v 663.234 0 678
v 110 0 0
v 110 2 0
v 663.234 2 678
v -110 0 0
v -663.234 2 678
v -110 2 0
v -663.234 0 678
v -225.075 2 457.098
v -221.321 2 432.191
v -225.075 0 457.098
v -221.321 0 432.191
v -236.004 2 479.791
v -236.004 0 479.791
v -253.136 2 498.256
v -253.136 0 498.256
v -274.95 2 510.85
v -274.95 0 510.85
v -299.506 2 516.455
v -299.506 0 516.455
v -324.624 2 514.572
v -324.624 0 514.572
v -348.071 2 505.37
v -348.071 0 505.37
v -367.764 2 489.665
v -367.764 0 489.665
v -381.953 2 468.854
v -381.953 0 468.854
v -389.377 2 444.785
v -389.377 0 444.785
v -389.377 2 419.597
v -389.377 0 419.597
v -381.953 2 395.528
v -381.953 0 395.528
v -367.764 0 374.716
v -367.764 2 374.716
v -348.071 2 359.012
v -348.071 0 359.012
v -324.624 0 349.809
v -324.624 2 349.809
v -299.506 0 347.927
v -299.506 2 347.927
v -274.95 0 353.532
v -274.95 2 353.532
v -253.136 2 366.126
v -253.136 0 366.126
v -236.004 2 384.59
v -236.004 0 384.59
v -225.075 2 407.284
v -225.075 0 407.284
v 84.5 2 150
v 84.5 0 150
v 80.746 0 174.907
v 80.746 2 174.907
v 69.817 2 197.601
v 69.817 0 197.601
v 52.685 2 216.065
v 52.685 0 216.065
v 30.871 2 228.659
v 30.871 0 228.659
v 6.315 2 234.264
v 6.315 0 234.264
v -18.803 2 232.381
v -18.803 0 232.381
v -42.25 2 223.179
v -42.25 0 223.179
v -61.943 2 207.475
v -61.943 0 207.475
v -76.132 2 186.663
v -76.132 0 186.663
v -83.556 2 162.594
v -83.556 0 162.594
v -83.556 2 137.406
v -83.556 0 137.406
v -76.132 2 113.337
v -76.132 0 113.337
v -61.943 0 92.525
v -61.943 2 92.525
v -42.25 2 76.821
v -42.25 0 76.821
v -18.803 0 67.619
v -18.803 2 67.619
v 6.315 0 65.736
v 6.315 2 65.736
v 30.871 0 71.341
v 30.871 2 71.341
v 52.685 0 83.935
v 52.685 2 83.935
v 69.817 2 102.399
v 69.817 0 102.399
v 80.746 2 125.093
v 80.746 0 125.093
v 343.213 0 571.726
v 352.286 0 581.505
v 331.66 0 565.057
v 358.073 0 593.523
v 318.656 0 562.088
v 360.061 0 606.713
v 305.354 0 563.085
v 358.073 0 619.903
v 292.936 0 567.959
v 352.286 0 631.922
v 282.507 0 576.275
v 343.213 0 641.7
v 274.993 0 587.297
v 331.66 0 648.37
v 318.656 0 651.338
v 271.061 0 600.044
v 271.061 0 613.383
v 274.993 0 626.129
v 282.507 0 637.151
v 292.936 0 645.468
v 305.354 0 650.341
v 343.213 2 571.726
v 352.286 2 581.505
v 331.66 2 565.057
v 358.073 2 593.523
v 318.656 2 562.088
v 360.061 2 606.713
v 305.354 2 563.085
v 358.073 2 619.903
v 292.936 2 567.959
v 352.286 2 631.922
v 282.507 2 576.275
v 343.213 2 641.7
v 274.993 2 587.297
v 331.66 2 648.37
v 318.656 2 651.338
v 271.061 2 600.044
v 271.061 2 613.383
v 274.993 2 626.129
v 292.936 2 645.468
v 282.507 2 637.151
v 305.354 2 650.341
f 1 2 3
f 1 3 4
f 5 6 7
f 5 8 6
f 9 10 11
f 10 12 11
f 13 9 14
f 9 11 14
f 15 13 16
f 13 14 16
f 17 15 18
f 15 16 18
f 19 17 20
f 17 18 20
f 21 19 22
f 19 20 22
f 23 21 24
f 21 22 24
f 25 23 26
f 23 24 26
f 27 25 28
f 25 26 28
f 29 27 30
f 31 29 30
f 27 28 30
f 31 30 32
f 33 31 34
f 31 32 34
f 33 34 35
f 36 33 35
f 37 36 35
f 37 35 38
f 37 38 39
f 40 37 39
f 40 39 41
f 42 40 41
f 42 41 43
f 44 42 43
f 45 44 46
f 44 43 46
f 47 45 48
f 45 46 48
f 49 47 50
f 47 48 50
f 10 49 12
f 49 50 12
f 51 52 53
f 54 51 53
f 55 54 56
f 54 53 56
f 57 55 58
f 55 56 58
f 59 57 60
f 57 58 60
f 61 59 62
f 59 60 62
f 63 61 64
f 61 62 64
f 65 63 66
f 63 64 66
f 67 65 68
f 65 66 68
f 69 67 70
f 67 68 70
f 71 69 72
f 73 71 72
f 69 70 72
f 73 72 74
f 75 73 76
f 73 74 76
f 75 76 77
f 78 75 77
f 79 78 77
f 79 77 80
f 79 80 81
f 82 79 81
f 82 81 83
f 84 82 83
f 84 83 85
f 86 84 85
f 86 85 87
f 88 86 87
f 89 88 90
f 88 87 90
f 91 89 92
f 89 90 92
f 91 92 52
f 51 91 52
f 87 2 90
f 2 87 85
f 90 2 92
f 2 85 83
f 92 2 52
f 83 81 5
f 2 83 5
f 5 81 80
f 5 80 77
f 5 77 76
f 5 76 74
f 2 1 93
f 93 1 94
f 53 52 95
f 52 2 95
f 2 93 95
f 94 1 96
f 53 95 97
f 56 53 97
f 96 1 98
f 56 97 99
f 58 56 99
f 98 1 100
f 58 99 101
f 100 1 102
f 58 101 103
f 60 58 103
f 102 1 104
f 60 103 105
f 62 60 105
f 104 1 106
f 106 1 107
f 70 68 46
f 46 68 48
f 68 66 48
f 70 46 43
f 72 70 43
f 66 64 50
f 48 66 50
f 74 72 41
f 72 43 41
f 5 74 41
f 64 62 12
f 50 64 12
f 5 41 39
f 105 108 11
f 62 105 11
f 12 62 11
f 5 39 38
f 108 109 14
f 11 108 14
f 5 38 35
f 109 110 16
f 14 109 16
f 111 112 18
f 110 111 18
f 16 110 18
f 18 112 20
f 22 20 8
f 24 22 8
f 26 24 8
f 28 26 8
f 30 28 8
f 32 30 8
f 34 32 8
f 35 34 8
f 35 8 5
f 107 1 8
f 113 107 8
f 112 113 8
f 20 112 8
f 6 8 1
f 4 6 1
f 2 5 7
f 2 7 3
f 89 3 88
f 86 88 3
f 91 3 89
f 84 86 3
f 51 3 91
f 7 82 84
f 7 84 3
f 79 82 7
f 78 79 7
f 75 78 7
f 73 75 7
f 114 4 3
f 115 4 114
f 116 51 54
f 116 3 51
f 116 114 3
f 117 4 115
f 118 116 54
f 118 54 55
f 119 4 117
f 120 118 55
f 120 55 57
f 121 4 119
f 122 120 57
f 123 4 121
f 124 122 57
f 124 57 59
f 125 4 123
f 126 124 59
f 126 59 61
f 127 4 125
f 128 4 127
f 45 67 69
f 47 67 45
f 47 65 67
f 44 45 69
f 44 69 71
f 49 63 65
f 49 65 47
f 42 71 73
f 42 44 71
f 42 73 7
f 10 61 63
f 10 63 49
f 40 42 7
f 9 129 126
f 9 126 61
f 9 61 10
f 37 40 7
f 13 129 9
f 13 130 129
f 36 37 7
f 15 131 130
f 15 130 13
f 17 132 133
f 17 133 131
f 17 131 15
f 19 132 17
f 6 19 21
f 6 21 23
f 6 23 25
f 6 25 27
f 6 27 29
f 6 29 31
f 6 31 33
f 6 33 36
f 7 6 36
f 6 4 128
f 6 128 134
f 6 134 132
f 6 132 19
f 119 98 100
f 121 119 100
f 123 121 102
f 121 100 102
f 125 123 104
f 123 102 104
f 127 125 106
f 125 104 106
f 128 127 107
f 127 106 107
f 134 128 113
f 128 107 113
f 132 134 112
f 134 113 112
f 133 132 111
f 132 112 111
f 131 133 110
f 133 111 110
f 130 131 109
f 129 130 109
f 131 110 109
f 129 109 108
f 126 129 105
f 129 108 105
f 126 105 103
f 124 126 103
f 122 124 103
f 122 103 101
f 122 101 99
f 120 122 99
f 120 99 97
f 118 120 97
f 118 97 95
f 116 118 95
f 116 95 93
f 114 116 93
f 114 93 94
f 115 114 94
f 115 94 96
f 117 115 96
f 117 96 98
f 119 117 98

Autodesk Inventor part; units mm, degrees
ref_plane "YZ Plane" through (0, 0, 0) normal (1, 0, 0) x (0, 1, 0)
ref_plane "XZ Plane" through (0, 0, 0) normal (0, 1, 0) x (-1, 0, 0)
ref_plane "XY Plane" through (0, 0, 0) normal (0, 0, 1) x (1, 0, 0)
sketch "Sketch1" plane through (0, 0, 0) normal (0, 1, 0) x (-1, 0, 0)
  line L0 (0, 820) -> (0, 0)
  line L1 (760, 796.5895) -> (760, 820)
  line L2 (760, 820) -> (0, 820)
  line L3 (760, 796.5895) -> (110, 0)
  line L4 (110, 0) -> (0, 0)
  line L5 (758.3, 820) -> (755.9389, 786.2346)
  line L6 (755.9389, 786.2346) -> (686.7934, 701.4952)
  line L7 (686.7934, 701.4952) -> (684.7101, 704.3201)
  line L8 (663.2335, 678) -> (0, 678)
  dimension "d1" = 760
  dimension "d2" = 23.411
  dimension "d5" = 129.214
  dimension "d6" = 110
  dimension "d7" = 1.7
  dimension "d8" = 3.4
  dimension "d9" = 820
  dimension "d10" = 4
  dimension "d11" = 109.37
  dimension "d12" = 75.621
  dimension "d22" = 678
extrude "Plate1" add sketch "Sketch1" along normal blind 2 contours L8 L3 L4 L0
mirror "Mirror1" about plane through (0, 0, 0) normal (1, 0, 0)
sketch "Sketch2" plane through (0, 0, 0) normal (0, -1, 0) x (1, 0, 0)
  line L0 (-110, 0) -> (110, 0) construction
  line L1 (-110, 0) -> (-663.2335, 678) construction
  circle A0 centre (-305.821, 432.1909) radius 84.5
  line L2 (-663.2335, 678) -> (663.2335, 678) projected
  line L3 (110, 0) -> (663.2335, 678) construction
  circle A1 centre (0, 150) radius 84.5
  circle A2 centre (315.3114, 606.7132) radius 44.75
  line L4 (-110, 0) -> (110, 0) construction
  line L5 (-221.321, 432.1909) -> (-221.321, 136.4263) construction
  line L6 (-84.5, 150) -> (-84.5, -31.2508) construction
  line L7 (84.5, 150) -> (84.5, 0) construction
  line L8 (270.5614, 606.7132) -> (270.5614, 0) construction
  line L9 (-305.821, 516.6909) -> (270.5614, 516.6909) construction
  line L10 (-305.821, 347.6909) -> (270.5614, 347.6909) construction
  line L11 (0, 234.5) -> (270.5614, 234.5) construction
  line L12 (315.3114, 561.9632) -> (270.5614, 561.9632) construction
  point P0 (0, 0)
  point P1 (0, 0)
  point P2 (0, 0)
  point P3 (0, 0)
  point P4 (-84.5, 59.3746)
  dimension "d13" = 169
  dimension "d16" = 150
  dimension "d17" = 432.191
  dimension "d18" = 305.821
  dimension "d19" = 113.191
  dimension "d20" = 89.5
  dimension "d21" = 136.821
extrude "Extrusion1" cut sketch "Sketch2" against normal through all
equation "\"d3\" = Thickness"
equation "\"BendRadius\" = Thickness"
equation "\"BendReliefWidth\" = Thickness"
equation "\"BendReliefDepth\" = 0.5 * Thickness"
equation "\"CornerReliefSize\" = 4 * Thickness"
equation "\"MinimumRemnant\" = 2 * Thickness"
equation "\"TransitionRadius\" = BendRadius"
equation "\"JacobiRadiusSize\" = BendRadius"
equation "\"GapSize\" = Thickness"
equation "\"Thickness\" = 2"
properties part number "МОО 073 face 3"
